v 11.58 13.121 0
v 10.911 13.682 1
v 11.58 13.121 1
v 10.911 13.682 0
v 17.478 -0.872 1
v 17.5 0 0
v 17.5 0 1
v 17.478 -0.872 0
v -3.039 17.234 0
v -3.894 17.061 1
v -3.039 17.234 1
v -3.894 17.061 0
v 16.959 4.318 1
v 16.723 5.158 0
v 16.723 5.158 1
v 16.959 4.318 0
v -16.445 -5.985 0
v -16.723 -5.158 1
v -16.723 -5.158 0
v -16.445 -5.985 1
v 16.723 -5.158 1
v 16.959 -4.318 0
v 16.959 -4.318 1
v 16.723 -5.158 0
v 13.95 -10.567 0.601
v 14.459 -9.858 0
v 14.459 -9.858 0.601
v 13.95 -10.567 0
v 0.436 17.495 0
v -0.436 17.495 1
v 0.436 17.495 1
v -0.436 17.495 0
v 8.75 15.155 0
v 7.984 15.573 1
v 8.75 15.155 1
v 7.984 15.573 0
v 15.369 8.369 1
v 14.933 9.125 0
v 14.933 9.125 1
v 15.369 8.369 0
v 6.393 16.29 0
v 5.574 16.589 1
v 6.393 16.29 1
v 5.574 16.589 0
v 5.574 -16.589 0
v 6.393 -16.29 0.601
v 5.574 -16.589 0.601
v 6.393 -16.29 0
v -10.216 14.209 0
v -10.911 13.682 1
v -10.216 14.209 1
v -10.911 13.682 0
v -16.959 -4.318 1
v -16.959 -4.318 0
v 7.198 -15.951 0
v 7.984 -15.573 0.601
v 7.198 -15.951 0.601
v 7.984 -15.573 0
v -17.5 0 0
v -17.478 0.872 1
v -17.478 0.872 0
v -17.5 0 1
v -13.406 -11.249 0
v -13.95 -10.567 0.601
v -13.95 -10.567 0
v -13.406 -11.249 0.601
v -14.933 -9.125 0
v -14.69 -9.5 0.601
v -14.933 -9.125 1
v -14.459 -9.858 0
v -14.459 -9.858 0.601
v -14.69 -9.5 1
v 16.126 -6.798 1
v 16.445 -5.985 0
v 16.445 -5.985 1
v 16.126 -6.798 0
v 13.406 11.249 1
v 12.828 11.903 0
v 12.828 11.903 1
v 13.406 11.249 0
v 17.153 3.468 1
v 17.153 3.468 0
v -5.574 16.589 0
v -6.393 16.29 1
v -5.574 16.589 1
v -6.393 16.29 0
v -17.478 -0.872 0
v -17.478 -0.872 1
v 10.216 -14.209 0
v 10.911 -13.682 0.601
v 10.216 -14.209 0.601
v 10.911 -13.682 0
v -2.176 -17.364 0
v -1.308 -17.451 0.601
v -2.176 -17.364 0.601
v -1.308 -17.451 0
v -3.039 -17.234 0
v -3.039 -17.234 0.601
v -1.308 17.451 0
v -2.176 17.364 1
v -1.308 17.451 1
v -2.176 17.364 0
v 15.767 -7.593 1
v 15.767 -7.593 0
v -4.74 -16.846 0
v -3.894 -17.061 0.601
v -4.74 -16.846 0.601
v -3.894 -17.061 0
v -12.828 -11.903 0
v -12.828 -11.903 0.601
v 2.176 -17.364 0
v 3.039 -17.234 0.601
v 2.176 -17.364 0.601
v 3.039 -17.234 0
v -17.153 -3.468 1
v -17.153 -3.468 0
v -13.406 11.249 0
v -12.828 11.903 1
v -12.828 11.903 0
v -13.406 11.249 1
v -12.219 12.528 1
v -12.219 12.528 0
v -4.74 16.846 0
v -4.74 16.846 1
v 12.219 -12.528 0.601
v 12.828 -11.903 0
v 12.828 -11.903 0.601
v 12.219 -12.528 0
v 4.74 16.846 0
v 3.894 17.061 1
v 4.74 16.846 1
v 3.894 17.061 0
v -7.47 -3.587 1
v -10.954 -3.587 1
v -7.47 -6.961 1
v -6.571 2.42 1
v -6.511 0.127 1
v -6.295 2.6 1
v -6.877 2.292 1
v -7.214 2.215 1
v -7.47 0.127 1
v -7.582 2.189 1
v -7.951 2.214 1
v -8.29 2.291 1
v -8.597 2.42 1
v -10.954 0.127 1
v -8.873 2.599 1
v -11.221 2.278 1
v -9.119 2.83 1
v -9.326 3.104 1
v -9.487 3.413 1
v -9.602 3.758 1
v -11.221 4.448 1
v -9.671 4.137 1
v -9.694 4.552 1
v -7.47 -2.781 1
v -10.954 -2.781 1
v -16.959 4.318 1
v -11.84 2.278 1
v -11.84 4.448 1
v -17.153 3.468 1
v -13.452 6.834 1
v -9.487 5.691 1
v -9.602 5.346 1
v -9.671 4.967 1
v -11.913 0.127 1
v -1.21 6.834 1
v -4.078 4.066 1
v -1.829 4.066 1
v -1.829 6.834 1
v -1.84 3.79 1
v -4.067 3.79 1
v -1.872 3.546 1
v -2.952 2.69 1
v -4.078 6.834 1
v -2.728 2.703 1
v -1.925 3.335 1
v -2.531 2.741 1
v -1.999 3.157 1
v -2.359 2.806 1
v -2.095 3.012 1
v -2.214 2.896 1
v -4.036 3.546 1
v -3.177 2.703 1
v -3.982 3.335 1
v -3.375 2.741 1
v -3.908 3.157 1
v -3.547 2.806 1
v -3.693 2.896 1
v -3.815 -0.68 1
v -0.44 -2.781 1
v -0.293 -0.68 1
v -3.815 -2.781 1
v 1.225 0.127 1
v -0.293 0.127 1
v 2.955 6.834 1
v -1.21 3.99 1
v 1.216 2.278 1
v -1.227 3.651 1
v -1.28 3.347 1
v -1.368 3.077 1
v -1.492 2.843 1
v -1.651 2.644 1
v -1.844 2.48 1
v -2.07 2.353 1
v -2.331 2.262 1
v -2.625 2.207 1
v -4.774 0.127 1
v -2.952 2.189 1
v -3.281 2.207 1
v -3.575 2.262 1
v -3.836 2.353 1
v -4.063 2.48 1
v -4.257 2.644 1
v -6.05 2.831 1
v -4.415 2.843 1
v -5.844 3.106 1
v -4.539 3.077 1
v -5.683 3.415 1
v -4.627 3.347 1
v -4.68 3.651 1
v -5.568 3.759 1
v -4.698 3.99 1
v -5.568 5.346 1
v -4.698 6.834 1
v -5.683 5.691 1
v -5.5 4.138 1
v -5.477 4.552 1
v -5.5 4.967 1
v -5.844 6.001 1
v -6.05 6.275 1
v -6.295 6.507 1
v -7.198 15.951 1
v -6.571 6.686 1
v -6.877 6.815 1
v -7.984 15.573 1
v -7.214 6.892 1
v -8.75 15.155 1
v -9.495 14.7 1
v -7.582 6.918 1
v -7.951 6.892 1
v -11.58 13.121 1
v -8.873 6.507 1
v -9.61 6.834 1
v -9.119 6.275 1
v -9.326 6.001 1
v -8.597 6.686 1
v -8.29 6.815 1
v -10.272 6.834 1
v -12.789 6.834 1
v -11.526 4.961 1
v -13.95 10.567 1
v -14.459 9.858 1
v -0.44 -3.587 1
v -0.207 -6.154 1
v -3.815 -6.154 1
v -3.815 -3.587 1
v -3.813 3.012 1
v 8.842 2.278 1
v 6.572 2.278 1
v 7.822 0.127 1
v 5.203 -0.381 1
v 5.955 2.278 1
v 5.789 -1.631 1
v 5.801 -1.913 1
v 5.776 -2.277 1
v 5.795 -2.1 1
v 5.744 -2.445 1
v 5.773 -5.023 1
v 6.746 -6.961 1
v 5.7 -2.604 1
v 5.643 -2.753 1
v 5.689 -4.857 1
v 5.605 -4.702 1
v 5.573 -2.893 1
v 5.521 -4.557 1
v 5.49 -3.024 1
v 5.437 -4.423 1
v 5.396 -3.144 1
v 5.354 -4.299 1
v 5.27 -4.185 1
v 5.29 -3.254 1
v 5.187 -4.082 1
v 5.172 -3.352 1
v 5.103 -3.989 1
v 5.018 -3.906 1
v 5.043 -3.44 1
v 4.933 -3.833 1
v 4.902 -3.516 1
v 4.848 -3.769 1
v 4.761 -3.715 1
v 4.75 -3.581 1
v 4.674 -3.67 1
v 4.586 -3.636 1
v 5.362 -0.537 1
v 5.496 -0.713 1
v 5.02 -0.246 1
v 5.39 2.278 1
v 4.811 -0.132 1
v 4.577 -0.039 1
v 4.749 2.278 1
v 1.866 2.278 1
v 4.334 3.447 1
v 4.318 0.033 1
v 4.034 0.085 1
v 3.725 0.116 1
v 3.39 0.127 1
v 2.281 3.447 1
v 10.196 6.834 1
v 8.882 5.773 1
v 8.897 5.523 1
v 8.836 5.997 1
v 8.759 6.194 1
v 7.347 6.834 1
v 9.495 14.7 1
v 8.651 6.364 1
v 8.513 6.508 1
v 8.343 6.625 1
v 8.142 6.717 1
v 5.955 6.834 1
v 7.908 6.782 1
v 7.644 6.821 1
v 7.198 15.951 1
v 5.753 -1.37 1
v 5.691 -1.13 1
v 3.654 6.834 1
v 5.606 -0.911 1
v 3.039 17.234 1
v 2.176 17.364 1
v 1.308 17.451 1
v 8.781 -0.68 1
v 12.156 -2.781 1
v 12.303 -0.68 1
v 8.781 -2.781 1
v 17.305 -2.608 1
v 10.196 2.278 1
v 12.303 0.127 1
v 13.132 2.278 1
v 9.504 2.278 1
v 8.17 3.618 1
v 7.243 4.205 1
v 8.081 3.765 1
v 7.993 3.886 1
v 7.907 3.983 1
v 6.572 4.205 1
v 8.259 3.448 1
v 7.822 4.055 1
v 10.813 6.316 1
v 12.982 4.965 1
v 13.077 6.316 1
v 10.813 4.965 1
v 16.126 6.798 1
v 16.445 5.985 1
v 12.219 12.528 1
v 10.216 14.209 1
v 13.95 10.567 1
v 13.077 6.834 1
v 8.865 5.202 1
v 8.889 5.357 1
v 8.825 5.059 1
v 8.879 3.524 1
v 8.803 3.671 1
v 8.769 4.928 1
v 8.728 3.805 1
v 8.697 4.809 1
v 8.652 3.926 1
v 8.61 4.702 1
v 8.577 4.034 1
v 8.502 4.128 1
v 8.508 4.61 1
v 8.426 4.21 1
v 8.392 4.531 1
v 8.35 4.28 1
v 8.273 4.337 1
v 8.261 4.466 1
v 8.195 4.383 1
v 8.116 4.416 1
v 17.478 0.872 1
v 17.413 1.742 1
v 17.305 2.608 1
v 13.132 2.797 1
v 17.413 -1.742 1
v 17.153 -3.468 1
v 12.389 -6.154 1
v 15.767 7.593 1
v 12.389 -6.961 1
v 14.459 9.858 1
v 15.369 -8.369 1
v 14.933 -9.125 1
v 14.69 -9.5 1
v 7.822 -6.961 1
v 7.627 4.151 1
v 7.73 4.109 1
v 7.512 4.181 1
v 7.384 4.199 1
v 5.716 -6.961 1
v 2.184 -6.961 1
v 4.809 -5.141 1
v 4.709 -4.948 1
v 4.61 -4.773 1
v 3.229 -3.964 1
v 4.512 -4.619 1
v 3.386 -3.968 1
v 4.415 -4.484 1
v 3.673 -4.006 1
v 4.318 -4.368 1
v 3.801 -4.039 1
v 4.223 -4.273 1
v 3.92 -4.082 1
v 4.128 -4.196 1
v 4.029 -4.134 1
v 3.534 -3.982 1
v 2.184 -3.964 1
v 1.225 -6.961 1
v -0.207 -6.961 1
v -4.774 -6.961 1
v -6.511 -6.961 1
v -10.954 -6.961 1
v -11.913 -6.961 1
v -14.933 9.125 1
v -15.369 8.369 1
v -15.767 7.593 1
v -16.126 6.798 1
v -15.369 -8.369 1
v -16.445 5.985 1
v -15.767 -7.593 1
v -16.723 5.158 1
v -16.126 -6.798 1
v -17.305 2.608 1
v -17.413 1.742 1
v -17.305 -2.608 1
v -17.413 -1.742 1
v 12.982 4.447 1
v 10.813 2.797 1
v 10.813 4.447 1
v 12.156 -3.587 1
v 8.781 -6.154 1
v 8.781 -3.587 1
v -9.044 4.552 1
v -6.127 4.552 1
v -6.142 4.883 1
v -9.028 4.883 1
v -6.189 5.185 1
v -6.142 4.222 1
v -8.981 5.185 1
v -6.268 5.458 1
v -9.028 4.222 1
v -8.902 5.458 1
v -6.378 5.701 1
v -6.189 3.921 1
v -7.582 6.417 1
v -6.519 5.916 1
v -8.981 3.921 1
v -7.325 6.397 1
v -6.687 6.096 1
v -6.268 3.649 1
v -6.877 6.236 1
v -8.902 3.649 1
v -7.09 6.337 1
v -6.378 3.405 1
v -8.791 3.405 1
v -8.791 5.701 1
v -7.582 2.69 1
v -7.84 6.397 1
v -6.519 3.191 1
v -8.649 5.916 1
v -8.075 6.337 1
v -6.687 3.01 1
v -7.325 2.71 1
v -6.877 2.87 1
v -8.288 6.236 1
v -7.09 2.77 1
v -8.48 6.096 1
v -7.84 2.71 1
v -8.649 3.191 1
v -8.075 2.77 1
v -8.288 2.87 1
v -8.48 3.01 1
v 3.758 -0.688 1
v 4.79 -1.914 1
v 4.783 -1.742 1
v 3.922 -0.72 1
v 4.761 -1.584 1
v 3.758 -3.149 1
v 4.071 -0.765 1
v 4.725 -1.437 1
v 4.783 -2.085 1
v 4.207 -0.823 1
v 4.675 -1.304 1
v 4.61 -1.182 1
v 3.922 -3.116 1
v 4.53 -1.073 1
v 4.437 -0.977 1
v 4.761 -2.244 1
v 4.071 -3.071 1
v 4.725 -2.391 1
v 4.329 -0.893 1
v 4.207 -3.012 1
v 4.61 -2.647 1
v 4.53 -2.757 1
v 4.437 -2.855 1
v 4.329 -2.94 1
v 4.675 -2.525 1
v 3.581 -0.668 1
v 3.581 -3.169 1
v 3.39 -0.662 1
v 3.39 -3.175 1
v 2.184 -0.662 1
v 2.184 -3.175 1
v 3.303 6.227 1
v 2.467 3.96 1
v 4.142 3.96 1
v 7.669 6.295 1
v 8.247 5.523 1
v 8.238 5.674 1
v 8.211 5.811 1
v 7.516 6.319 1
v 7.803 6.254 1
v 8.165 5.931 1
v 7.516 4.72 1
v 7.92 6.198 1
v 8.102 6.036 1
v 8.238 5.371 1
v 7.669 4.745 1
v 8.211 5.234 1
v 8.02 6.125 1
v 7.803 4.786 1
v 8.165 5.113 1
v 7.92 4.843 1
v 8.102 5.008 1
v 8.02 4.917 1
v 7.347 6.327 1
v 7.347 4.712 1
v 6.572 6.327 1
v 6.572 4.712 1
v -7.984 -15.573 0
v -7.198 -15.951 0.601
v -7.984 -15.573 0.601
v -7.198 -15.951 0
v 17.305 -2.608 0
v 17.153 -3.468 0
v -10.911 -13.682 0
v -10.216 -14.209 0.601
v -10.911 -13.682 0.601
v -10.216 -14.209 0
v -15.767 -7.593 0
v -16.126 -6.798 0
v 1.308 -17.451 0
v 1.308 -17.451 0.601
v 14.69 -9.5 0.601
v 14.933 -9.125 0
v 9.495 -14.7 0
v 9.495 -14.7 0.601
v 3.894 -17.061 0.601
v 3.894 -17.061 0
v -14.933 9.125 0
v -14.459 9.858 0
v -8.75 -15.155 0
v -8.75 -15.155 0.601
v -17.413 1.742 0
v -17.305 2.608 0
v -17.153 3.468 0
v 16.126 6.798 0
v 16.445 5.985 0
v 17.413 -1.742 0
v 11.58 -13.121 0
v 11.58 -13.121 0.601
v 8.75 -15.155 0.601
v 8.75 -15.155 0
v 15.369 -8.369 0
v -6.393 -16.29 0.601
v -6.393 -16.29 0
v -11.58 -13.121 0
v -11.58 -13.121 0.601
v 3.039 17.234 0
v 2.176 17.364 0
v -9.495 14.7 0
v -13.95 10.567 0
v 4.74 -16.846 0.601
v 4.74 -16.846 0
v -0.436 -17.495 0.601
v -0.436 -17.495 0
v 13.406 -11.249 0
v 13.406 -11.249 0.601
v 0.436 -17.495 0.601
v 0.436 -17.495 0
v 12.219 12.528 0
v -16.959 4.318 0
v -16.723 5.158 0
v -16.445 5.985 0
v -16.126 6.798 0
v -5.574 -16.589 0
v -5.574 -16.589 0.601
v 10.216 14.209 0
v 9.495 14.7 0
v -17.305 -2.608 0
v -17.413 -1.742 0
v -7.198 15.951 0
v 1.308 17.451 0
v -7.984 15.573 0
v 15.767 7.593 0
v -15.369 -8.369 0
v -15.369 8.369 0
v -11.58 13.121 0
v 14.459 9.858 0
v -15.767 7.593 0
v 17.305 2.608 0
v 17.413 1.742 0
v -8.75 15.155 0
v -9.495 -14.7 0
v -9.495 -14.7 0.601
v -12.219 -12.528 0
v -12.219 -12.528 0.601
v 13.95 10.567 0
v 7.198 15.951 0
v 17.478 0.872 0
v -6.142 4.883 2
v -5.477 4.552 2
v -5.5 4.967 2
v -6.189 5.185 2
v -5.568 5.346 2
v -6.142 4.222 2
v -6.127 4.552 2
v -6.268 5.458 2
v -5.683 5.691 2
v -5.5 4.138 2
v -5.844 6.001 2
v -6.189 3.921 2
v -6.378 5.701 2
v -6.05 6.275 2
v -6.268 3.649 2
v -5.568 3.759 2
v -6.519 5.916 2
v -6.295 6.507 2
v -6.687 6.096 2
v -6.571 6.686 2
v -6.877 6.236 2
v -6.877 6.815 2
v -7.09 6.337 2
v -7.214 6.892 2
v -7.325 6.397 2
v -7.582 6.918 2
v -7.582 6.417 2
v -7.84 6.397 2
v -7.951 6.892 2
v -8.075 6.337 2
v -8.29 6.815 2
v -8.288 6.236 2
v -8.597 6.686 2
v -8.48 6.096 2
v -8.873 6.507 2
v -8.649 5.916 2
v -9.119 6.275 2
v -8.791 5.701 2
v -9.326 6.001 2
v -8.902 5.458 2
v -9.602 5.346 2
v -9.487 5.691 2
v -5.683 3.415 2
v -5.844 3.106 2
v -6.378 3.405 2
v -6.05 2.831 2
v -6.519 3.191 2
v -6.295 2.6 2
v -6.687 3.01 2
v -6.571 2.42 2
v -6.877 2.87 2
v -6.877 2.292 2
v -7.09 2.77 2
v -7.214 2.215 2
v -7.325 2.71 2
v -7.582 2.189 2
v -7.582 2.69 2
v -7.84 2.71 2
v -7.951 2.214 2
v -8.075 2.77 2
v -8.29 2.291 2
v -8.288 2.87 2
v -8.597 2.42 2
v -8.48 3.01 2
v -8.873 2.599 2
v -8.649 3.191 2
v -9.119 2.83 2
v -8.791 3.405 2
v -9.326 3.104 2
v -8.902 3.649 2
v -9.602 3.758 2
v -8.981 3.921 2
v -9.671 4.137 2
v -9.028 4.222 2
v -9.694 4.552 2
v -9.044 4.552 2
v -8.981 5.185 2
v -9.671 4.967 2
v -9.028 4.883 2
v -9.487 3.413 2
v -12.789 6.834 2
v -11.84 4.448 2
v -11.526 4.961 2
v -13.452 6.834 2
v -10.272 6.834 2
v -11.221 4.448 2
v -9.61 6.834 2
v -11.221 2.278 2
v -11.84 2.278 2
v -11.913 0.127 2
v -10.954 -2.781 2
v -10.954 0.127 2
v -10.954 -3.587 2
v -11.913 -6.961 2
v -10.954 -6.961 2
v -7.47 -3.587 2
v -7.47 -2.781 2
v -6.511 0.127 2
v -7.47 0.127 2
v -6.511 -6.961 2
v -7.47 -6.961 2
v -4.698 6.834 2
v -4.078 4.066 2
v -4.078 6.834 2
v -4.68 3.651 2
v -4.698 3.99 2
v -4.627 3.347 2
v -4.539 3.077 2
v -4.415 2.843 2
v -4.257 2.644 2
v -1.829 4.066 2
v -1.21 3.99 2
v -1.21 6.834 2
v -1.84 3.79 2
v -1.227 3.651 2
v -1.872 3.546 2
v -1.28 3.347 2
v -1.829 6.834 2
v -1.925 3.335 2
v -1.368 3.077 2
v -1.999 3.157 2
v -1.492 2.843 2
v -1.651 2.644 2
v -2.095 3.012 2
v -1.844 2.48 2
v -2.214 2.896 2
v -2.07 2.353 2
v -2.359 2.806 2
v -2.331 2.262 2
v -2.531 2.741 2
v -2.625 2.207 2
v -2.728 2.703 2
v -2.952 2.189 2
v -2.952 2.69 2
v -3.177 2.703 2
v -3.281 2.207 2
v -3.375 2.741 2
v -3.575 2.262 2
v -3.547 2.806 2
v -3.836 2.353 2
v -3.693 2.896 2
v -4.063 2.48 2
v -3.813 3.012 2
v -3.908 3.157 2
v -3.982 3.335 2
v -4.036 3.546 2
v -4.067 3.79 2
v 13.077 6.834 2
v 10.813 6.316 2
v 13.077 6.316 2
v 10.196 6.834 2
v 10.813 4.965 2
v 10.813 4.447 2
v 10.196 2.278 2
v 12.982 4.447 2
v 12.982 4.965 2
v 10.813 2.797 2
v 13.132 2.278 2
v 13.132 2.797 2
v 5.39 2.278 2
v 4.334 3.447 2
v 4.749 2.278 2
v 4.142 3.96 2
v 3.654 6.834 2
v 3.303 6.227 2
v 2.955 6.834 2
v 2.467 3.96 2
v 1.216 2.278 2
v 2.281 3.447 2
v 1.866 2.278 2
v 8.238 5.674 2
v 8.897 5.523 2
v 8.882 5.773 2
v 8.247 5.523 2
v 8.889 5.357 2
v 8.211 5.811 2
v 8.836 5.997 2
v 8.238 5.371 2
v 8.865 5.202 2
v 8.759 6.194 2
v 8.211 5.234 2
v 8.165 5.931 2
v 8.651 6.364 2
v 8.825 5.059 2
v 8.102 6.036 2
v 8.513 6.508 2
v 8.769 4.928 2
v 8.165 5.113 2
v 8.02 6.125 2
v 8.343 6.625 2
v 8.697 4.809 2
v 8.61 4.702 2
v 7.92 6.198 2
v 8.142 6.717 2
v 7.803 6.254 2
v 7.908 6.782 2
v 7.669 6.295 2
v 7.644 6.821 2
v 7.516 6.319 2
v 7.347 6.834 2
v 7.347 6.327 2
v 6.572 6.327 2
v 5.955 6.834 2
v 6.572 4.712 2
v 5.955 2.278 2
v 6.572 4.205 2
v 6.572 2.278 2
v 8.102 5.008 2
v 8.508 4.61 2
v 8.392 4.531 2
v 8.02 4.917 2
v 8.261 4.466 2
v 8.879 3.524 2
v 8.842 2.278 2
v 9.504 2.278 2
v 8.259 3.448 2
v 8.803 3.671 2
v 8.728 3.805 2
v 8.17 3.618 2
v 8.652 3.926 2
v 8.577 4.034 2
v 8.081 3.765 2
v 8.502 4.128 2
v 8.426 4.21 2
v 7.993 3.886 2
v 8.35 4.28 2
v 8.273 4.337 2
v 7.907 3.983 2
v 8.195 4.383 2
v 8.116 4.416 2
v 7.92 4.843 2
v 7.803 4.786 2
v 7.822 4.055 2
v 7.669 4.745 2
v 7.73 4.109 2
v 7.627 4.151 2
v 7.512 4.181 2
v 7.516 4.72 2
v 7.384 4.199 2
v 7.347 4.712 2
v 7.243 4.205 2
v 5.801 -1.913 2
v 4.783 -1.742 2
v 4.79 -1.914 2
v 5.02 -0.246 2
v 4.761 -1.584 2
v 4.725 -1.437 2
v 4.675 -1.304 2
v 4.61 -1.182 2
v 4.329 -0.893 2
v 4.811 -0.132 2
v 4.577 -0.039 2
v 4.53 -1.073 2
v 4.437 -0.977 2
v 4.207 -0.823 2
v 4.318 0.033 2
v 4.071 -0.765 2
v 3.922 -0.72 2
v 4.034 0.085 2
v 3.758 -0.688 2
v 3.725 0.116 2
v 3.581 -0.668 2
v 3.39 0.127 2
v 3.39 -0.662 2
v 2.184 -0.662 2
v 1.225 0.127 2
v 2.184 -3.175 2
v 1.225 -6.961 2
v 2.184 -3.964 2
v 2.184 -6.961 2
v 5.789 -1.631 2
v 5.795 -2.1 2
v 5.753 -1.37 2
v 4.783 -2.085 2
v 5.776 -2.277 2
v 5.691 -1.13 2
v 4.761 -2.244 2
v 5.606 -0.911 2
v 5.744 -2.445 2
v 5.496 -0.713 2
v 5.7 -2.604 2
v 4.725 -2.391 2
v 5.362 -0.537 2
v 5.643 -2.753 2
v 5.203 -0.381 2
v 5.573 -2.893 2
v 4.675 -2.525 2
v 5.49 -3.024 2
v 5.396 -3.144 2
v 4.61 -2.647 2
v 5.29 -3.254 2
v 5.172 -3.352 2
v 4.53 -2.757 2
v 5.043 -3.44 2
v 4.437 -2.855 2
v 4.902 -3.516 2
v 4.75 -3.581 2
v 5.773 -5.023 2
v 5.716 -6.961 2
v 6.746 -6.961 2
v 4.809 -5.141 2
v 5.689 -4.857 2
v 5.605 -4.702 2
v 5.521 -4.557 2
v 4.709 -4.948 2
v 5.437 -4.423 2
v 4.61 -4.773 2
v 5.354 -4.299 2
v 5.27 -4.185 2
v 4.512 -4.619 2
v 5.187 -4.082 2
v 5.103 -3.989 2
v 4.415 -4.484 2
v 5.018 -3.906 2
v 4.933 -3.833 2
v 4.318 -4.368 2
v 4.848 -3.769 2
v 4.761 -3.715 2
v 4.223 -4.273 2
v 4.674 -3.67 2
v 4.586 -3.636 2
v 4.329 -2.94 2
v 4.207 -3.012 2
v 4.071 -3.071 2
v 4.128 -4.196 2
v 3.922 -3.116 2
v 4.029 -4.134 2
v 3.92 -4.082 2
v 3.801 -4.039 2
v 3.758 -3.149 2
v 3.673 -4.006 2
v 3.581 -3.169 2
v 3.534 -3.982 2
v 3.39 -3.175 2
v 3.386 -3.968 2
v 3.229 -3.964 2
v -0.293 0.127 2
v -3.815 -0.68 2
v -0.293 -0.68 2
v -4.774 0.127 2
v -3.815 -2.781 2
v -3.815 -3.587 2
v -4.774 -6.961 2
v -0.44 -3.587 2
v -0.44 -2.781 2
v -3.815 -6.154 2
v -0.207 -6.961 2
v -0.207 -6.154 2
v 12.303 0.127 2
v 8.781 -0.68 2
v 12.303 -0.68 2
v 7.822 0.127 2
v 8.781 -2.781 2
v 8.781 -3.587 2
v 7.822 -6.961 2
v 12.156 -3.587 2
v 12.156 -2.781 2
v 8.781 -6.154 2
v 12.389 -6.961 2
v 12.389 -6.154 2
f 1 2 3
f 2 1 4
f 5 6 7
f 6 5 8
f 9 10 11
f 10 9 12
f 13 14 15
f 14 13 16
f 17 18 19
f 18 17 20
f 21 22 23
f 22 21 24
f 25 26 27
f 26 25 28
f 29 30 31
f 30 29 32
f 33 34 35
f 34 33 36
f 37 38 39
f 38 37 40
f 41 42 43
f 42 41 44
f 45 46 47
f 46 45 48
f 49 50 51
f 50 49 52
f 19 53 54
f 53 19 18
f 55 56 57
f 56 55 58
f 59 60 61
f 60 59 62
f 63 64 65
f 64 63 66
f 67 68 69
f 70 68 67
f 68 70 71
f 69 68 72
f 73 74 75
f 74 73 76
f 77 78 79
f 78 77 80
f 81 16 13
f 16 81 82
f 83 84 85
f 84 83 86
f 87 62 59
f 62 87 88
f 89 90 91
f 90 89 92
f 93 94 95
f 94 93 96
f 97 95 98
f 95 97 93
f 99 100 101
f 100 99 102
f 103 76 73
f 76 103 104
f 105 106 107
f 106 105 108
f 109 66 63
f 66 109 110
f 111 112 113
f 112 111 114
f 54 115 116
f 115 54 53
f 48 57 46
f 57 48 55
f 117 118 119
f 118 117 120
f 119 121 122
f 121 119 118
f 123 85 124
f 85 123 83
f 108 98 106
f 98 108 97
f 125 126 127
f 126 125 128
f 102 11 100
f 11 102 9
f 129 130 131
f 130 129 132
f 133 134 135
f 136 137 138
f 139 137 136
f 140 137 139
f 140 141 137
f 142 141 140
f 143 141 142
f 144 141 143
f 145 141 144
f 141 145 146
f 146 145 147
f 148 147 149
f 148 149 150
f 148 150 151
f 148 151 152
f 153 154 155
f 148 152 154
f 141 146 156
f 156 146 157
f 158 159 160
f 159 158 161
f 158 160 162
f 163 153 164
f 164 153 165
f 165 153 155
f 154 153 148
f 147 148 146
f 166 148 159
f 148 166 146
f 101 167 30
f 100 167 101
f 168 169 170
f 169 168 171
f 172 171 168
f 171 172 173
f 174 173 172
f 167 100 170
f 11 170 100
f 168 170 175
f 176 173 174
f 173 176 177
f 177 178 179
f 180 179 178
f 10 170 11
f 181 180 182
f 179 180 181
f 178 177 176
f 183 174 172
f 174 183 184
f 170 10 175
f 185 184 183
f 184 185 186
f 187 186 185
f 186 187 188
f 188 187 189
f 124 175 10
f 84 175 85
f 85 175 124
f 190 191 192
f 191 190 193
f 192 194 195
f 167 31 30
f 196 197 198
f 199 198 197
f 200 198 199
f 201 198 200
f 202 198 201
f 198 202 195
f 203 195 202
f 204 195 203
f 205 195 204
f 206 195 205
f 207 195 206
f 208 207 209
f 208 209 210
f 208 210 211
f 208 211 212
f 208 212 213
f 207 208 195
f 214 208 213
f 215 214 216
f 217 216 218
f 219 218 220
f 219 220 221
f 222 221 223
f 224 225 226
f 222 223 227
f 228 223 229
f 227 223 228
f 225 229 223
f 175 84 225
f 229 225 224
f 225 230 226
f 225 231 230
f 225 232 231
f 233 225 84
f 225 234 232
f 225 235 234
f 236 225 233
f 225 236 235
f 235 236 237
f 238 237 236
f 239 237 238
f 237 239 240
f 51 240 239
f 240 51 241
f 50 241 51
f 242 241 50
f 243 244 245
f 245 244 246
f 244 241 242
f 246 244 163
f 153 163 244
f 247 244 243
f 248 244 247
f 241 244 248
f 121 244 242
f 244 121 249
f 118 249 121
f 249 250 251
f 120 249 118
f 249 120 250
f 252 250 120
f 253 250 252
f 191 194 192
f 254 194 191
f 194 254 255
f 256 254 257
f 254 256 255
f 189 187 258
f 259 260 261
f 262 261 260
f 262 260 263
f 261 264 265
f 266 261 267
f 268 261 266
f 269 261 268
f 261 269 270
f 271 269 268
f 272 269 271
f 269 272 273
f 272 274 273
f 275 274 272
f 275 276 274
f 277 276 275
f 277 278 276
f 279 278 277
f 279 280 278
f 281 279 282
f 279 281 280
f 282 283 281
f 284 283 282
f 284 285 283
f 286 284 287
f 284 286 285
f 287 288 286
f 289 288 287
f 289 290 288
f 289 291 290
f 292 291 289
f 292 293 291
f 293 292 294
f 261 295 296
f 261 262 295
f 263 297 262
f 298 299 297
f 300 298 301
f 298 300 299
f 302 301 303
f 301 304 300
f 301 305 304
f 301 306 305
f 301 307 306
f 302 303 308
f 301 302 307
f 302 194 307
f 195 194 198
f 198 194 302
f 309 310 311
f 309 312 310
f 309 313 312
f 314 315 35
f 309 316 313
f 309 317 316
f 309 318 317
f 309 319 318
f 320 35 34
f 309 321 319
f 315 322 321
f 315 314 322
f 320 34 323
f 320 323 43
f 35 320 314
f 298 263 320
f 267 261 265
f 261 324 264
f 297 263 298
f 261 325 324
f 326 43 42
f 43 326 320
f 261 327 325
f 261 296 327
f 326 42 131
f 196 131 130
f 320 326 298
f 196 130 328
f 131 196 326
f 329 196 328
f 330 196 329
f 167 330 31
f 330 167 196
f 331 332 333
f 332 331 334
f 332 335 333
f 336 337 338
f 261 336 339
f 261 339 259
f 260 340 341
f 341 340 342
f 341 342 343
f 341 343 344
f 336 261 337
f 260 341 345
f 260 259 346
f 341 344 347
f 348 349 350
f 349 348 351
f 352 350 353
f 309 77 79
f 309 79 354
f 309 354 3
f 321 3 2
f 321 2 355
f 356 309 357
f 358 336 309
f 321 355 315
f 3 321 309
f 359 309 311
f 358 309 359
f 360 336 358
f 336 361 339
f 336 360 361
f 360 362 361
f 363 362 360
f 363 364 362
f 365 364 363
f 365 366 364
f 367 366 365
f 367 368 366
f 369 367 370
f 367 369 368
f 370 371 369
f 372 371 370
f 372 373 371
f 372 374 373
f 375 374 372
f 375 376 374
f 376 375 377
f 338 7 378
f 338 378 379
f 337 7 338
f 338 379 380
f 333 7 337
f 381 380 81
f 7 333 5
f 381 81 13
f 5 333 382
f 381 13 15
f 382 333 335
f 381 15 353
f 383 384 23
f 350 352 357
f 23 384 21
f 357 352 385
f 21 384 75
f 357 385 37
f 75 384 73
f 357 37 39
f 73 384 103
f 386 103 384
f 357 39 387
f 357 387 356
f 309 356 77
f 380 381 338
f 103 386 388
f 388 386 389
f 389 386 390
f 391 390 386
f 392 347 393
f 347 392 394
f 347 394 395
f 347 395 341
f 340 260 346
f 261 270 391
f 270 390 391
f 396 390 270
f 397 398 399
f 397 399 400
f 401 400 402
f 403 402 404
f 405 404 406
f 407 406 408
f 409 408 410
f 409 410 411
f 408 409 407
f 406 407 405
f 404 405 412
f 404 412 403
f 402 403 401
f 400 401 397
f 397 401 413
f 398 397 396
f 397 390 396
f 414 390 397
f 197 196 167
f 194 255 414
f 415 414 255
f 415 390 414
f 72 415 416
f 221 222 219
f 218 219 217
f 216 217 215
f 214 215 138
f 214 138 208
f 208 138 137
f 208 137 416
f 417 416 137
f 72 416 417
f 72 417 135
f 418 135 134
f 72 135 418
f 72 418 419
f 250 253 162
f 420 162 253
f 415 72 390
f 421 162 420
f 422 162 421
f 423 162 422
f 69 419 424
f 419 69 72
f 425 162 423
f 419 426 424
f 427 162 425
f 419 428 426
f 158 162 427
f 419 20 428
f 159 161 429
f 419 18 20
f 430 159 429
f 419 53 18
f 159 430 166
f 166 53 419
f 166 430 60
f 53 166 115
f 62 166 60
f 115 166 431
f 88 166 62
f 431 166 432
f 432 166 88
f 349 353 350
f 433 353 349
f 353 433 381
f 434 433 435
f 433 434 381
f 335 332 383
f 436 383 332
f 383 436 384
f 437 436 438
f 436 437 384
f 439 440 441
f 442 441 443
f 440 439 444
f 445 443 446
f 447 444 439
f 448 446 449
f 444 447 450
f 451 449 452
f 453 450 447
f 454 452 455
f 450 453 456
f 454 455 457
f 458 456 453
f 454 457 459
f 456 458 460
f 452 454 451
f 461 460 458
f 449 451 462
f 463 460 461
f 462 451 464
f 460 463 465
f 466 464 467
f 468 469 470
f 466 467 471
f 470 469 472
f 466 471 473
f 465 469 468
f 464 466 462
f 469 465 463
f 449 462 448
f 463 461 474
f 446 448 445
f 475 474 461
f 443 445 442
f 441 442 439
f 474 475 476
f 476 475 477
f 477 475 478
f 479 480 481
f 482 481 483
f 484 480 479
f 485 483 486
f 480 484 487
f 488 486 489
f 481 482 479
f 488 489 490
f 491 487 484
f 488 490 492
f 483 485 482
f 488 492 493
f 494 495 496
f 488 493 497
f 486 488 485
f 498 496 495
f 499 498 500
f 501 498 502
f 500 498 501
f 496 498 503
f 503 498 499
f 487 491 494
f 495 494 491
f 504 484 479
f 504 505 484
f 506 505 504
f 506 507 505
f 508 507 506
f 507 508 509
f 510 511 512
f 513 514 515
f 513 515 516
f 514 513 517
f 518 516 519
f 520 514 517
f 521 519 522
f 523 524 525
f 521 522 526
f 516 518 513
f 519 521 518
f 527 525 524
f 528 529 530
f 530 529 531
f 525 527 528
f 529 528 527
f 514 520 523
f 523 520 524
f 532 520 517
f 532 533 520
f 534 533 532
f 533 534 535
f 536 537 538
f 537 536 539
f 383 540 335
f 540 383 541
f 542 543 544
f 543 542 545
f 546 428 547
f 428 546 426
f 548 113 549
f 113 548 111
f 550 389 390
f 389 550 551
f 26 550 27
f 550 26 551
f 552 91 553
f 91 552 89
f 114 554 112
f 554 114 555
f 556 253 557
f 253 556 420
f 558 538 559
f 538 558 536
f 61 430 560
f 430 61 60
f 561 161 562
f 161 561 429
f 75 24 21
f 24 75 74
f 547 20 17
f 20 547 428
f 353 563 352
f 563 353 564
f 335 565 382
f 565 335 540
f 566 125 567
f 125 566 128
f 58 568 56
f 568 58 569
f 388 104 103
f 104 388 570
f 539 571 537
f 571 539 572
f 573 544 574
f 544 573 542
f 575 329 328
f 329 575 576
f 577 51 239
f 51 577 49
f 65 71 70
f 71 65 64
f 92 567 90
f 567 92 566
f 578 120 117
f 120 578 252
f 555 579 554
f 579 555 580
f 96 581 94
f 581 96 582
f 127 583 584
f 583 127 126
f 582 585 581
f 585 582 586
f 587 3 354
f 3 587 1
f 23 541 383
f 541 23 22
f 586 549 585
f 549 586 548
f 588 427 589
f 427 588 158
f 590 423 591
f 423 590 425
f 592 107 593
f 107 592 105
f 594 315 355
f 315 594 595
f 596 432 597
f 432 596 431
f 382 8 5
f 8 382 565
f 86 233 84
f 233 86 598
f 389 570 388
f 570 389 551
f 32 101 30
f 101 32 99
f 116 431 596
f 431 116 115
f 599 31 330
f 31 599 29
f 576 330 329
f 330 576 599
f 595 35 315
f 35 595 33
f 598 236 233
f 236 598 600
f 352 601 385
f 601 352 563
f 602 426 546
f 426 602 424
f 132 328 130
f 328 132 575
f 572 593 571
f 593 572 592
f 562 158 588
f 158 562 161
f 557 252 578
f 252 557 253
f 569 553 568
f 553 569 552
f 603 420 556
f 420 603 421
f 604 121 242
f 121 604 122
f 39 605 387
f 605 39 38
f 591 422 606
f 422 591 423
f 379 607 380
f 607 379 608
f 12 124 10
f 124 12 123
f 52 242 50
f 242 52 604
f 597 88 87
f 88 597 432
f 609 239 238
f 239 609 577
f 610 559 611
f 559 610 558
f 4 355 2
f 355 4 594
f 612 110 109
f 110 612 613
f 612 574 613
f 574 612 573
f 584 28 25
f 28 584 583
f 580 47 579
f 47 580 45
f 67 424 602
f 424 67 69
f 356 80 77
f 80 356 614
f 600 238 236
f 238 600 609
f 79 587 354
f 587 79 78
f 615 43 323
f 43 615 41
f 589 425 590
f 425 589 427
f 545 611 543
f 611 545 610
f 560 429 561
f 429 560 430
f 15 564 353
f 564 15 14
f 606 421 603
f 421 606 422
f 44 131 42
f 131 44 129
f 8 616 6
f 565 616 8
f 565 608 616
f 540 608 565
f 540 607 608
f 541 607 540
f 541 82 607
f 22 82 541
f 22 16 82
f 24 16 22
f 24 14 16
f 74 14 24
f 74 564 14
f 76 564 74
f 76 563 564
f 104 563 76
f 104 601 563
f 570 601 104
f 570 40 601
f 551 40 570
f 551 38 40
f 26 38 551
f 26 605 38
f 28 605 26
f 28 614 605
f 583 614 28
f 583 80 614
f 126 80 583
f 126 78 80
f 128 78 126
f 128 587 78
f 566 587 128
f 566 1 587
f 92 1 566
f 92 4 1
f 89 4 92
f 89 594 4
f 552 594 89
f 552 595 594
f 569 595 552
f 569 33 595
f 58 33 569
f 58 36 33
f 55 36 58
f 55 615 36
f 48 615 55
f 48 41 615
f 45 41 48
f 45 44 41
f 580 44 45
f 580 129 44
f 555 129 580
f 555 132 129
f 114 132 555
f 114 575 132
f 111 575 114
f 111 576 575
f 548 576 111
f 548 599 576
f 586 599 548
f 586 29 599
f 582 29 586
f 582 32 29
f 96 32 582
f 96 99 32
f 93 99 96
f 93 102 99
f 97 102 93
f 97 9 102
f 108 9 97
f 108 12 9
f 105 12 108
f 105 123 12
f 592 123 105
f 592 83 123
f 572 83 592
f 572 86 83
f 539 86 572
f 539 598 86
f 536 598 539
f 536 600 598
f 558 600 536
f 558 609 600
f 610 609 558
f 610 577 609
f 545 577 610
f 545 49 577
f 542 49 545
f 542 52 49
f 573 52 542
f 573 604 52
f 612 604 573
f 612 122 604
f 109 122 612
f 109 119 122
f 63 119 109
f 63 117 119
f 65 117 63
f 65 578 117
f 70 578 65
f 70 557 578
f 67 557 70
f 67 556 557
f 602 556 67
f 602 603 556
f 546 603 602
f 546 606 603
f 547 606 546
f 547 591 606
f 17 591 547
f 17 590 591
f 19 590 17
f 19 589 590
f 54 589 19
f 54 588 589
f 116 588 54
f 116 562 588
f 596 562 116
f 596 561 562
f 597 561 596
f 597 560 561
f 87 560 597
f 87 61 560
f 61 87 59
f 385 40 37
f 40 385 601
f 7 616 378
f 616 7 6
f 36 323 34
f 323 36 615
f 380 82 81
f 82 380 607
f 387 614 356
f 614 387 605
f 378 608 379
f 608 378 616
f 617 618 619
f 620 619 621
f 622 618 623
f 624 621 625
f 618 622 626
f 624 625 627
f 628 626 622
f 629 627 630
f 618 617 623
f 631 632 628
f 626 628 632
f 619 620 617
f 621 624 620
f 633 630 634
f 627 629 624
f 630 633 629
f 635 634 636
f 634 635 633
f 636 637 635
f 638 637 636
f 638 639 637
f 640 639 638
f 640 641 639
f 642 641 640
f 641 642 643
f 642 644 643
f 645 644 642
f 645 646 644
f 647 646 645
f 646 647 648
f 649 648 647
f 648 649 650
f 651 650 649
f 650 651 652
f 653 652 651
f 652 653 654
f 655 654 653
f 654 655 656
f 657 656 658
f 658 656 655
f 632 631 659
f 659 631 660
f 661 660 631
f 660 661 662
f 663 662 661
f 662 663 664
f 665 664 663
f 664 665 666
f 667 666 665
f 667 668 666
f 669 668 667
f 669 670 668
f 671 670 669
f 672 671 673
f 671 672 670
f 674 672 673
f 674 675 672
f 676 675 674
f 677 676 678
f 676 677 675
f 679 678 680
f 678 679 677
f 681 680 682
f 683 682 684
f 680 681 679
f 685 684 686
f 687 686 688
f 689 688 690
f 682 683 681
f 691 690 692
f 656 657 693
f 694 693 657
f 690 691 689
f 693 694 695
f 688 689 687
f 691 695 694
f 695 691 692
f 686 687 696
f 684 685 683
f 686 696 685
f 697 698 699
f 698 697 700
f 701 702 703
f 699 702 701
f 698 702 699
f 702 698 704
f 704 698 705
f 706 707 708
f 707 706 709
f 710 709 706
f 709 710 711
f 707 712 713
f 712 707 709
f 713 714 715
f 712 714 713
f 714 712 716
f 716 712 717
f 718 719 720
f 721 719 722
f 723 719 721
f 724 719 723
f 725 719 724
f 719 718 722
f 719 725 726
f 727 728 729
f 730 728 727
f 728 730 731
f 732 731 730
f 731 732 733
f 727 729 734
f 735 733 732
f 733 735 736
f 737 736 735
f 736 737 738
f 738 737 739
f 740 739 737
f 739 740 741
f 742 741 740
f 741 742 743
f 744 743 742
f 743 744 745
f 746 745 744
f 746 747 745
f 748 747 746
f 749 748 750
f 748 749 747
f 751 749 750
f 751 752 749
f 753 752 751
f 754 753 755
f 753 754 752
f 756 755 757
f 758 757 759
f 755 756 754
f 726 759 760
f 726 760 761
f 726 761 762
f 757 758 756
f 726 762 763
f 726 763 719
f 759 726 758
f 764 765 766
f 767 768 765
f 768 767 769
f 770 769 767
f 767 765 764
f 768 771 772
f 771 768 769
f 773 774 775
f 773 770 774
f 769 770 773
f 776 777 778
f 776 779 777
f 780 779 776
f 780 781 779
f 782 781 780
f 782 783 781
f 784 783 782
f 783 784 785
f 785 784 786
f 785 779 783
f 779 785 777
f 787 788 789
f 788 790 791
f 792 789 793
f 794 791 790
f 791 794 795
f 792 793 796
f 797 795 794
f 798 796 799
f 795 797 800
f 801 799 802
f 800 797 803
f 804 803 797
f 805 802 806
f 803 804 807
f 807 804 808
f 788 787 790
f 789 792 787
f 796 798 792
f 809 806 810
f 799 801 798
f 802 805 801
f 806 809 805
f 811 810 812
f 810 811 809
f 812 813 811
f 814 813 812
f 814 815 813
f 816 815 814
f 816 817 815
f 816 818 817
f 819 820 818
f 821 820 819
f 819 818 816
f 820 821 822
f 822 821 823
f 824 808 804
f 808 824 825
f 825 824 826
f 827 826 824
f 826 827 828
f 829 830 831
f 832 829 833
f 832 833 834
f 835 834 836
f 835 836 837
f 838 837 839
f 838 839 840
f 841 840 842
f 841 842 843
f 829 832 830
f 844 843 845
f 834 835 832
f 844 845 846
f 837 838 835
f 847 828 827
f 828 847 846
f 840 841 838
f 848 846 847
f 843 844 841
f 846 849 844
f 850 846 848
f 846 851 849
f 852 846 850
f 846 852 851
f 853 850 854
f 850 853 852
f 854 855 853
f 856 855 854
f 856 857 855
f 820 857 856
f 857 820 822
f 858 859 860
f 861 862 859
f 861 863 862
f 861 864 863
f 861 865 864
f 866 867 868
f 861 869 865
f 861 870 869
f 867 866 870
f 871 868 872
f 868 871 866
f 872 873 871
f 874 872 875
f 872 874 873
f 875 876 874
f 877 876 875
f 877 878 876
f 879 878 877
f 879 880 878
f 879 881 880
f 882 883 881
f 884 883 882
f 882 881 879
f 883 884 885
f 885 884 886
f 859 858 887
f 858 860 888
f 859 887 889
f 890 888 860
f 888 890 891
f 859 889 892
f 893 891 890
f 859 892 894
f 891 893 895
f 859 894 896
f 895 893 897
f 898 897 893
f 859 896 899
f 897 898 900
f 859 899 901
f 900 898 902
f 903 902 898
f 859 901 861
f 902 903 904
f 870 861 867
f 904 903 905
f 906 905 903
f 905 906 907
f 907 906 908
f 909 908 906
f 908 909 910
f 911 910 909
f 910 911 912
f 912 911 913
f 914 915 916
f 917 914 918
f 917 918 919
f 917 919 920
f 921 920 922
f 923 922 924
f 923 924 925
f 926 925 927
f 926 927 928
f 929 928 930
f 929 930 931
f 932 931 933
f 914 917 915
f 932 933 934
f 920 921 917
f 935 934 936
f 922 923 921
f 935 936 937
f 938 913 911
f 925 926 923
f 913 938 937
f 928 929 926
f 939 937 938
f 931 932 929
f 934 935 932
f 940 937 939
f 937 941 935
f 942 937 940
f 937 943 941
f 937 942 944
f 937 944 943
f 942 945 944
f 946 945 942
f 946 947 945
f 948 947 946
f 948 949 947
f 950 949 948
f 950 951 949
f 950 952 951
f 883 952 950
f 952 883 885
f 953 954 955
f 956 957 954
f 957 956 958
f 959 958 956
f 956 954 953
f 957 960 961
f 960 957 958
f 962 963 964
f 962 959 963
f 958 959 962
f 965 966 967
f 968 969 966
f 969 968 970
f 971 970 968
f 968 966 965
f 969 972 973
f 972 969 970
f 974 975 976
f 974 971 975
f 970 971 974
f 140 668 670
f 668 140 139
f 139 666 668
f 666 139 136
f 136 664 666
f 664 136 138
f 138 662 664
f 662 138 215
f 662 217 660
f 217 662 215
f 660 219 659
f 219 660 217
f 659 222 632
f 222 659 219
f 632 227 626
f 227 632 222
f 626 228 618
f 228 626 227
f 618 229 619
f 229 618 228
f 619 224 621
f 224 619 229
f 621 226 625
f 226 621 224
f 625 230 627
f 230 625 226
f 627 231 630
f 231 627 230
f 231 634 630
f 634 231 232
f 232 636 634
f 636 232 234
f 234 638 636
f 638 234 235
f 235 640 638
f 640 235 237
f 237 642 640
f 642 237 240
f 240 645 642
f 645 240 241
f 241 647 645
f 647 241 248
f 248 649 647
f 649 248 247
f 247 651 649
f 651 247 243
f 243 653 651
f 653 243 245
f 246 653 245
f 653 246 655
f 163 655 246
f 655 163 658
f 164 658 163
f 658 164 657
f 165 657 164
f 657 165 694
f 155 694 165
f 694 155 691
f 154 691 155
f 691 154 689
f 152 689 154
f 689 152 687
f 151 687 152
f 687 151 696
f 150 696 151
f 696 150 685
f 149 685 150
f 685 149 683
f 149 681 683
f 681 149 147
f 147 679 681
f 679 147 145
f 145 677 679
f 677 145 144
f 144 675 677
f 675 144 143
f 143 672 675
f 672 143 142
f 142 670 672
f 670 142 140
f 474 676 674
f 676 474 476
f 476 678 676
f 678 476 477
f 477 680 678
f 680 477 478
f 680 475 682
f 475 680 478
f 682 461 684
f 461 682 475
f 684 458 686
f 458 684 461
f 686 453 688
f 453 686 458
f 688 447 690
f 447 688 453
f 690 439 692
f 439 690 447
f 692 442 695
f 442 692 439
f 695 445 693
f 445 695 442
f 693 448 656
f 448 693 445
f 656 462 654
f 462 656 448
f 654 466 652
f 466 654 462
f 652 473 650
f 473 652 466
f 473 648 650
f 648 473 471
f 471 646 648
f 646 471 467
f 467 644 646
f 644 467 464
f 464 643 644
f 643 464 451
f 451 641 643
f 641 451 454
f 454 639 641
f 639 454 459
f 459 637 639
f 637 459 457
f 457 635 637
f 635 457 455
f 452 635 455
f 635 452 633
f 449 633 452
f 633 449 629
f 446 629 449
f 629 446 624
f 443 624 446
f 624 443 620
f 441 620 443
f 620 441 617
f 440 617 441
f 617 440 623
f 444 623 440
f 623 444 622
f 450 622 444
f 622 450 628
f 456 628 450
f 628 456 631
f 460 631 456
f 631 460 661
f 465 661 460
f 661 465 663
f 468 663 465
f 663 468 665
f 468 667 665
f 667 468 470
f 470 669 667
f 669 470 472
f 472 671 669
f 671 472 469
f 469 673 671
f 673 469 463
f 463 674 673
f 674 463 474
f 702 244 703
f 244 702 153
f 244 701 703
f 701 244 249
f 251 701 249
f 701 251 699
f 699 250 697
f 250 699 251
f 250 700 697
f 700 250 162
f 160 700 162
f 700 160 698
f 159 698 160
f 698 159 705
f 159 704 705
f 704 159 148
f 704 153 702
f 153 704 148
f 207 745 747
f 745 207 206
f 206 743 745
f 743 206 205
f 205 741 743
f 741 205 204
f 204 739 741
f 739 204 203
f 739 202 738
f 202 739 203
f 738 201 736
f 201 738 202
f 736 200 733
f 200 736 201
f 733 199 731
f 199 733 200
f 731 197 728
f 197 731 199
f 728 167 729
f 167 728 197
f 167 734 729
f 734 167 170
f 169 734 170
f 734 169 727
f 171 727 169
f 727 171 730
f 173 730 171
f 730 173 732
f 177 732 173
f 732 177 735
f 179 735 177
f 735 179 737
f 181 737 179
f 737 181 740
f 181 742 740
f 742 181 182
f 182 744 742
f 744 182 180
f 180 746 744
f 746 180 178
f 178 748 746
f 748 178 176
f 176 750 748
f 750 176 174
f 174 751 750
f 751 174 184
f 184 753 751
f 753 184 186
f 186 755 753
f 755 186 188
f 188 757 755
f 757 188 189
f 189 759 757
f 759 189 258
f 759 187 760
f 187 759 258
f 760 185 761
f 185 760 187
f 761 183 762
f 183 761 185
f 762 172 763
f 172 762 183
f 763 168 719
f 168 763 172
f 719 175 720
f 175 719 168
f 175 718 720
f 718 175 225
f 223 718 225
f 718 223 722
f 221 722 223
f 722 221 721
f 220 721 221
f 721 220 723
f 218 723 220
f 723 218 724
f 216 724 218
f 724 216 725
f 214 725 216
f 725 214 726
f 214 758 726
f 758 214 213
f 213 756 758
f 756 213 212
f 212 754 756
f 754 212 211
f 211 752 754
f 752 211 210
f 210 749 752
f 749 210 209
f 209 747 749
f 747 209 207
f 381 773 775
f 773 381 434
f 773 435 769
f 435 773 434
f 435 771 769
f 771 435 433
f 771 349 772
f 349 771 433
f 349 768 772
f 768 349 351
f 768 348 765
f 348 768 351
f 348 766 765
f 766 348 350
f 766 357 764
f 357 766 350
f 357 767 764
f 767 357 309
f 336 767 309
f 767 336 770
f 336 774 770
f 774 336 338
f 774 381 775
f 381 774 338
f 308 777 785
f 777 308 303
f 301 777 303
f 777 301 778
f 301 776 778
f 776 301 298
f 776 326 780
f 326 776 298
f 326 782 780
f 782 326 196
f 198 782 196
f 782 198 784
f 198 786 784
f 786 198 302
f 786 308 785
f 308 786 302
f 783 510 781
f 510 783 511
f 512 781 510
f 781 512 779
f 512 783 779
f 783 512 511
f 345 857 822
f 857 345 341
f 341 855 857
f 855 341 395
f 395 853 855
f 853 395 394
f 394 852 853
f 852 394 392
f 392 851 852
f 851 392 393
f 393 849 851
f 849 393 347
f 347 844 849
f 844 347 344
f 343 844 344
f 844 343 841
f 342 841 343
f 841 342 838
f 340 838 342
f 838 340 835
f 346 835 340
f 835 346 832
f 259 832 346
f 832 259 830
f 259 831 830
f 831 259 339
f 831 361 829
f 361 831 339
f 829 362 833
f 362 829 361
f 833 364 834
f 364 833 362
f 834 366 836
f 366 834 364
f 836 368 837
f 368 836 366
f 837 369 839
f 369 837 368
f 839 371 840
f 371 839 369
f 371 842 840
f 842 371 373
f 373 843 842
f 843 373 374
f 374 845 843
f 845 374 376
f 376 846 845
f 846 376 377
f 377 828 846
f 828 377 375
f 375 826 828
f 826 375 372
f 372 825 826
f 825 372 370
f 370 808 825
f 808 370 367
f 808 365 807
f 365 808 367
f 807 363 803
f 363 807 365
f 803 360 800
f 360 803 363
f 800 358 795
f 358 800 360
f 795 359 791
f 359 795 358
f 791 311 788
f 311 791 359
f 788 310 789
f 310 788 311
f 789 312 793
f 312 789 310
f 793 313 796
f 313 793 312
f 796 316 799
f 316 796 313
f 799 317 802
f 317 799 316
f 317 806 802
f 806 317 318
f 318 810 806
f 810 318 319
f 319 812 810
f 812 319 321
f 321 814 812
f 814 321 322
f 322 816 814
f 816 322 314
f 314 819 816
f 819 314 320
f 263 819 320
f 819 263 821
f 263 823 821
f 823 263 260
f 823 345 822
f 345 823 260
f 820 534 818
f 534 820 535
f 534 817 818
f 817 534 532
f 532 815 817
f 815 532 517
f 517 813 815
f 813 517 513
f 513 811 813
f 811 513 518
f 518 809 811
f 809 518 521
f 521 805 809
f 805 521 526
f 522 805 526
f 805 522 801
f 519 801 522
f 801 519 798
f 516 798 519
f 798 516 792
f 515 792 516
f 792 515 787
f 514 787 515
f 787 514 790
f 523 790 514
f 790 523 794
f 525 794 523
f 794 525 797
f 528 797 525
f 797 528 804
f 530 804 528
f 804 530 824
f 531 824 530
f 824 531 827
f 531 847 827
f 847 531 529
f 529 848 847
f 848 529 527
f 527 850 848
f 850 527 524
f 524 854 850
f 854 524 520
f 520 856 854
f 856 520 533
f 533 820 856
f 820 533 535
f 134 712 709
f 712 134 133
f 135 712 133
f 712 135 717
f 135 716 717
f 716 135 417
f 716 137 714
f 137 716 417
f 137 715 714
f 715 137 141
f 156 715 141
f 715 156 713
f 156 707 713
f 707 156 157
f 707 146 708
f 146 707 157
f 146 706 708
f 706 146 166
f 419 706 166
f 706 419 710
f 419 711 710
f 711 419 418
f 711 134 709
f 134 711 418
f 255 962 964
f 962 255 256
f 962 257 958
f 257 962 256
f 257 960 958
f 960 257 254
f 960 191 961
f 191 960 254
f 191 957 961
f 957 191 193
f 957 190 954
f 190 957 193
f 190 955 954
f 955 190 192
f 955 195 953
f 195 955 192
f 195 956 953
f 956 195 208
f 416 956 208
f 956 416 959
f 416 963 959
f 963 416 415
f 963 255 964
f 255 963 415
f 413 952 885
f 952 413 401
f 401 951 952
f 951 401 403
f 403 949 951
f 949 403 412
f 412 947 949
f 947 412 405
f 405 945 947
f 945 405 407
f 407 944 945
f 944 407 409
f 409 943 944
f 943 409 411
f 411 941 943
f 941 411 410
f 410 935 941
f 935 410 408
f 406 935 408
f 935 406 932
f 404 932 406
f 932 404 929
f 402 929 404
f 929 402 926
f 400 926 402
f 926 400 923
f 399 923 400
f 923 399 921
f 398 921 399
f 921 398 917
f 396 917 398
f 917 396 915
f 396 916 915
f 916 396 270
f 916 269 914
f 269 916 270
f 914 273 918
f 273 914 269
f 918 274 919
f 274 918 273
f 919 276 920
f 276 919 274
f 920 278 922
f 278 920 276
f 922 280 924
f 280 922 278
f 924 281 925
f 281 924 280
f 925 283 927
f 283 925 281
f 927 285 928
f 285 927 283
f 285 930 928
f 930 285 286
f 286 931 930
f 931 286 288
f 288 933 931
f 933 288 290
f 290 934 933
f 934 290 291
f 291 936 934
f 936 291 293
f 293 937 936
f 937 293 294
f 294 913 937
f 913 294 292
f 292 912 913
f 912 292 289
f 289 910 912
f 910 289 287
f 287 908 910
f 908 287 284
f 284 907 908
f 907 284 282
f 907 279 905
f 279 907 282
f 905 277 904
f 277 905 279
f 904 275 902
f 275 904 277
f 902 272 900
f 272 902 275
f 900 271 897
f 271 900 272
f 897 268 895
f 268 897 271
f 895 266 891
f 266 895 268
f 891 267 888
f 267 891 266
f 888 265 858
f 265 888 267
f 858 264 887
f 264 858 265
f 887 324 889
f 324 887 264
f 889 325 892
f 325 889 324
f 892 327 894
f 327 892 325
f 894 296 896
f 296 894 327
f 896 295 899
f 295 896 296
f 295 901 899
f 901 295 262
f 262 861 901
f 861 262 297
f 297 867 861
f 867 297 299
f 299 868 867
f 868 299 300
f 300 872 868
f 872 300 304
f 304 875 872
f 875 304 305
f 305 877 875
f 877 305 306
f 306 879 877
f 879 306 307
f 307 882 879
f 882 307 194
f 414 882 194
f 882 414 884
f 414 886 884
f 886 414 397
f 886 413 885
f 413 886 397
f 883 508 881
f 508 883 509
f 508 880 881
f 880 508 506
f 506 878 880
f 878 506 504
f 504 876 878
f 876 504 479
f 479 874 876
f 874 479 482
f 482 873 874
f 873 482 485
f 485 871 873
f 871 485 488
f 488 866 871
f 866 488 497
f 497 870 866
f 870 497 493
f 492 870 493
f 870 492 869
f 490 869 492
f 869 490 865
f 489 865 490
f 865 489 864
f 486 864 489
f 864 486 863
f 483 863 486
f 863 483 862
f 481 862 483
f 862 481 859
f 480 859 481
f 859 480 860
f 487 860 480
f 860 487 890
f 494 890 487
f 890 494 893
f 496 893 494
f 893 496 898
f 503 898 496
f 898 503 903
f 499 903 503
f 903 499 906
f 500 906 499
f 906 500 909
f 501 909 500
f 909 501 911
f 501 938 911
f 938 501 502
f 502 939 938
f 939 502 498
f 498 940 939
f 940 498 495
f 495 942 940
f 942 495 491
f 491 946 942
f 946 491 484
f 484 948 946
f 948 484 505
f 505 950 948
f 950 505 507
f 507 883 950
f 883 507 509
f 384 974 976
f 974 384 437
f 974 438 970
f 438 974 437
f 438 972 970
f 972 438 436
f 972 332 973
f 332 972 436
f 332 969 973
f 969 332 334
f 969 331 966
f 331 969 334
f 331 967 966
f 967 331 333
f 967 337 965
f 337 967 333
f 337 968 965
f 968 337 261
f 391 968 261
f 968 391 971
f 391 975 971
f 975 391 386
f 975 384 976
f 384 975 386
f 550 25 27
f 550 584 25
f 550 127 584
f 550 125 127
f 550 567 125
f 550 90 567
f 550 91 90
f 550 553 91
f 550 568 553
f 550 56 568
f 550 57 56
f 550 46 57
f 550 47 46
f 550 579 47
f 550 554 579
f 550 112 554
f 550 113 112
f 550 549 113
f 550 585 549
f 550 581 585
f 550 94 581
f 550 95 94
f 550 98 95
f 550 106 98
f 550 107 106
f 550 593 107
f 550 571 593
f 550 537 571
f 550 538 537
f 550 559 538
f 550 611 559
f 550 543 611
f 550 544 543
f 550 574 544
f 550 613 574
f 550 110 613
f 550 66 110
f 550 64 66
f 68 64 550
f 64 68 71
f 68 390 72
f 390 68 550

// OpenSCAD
$fa = 1;
$fs = 1.75 / 2;

width = 35;
height = 60;

difference() {
    union() {
        linear_extrude(height = 1)
        circle(r = width / 2);

        linear_extrude(height = 2)
        union() {
            translate([0, 4.5])
            text(text = "YOU ARE", size = 4.5, font = "Lato:style=Black", halign = "center", valign = "center");
            translate([0, -3.5])
            text(text = "HERE", size = 7, font = "Lato:style=Black", halign = "center", valign = "center");
        }
    }

    translate([-100, -width / 2, 1 - 0.4 + 0.001])
    cube([200, 8, 0.4]);
}
